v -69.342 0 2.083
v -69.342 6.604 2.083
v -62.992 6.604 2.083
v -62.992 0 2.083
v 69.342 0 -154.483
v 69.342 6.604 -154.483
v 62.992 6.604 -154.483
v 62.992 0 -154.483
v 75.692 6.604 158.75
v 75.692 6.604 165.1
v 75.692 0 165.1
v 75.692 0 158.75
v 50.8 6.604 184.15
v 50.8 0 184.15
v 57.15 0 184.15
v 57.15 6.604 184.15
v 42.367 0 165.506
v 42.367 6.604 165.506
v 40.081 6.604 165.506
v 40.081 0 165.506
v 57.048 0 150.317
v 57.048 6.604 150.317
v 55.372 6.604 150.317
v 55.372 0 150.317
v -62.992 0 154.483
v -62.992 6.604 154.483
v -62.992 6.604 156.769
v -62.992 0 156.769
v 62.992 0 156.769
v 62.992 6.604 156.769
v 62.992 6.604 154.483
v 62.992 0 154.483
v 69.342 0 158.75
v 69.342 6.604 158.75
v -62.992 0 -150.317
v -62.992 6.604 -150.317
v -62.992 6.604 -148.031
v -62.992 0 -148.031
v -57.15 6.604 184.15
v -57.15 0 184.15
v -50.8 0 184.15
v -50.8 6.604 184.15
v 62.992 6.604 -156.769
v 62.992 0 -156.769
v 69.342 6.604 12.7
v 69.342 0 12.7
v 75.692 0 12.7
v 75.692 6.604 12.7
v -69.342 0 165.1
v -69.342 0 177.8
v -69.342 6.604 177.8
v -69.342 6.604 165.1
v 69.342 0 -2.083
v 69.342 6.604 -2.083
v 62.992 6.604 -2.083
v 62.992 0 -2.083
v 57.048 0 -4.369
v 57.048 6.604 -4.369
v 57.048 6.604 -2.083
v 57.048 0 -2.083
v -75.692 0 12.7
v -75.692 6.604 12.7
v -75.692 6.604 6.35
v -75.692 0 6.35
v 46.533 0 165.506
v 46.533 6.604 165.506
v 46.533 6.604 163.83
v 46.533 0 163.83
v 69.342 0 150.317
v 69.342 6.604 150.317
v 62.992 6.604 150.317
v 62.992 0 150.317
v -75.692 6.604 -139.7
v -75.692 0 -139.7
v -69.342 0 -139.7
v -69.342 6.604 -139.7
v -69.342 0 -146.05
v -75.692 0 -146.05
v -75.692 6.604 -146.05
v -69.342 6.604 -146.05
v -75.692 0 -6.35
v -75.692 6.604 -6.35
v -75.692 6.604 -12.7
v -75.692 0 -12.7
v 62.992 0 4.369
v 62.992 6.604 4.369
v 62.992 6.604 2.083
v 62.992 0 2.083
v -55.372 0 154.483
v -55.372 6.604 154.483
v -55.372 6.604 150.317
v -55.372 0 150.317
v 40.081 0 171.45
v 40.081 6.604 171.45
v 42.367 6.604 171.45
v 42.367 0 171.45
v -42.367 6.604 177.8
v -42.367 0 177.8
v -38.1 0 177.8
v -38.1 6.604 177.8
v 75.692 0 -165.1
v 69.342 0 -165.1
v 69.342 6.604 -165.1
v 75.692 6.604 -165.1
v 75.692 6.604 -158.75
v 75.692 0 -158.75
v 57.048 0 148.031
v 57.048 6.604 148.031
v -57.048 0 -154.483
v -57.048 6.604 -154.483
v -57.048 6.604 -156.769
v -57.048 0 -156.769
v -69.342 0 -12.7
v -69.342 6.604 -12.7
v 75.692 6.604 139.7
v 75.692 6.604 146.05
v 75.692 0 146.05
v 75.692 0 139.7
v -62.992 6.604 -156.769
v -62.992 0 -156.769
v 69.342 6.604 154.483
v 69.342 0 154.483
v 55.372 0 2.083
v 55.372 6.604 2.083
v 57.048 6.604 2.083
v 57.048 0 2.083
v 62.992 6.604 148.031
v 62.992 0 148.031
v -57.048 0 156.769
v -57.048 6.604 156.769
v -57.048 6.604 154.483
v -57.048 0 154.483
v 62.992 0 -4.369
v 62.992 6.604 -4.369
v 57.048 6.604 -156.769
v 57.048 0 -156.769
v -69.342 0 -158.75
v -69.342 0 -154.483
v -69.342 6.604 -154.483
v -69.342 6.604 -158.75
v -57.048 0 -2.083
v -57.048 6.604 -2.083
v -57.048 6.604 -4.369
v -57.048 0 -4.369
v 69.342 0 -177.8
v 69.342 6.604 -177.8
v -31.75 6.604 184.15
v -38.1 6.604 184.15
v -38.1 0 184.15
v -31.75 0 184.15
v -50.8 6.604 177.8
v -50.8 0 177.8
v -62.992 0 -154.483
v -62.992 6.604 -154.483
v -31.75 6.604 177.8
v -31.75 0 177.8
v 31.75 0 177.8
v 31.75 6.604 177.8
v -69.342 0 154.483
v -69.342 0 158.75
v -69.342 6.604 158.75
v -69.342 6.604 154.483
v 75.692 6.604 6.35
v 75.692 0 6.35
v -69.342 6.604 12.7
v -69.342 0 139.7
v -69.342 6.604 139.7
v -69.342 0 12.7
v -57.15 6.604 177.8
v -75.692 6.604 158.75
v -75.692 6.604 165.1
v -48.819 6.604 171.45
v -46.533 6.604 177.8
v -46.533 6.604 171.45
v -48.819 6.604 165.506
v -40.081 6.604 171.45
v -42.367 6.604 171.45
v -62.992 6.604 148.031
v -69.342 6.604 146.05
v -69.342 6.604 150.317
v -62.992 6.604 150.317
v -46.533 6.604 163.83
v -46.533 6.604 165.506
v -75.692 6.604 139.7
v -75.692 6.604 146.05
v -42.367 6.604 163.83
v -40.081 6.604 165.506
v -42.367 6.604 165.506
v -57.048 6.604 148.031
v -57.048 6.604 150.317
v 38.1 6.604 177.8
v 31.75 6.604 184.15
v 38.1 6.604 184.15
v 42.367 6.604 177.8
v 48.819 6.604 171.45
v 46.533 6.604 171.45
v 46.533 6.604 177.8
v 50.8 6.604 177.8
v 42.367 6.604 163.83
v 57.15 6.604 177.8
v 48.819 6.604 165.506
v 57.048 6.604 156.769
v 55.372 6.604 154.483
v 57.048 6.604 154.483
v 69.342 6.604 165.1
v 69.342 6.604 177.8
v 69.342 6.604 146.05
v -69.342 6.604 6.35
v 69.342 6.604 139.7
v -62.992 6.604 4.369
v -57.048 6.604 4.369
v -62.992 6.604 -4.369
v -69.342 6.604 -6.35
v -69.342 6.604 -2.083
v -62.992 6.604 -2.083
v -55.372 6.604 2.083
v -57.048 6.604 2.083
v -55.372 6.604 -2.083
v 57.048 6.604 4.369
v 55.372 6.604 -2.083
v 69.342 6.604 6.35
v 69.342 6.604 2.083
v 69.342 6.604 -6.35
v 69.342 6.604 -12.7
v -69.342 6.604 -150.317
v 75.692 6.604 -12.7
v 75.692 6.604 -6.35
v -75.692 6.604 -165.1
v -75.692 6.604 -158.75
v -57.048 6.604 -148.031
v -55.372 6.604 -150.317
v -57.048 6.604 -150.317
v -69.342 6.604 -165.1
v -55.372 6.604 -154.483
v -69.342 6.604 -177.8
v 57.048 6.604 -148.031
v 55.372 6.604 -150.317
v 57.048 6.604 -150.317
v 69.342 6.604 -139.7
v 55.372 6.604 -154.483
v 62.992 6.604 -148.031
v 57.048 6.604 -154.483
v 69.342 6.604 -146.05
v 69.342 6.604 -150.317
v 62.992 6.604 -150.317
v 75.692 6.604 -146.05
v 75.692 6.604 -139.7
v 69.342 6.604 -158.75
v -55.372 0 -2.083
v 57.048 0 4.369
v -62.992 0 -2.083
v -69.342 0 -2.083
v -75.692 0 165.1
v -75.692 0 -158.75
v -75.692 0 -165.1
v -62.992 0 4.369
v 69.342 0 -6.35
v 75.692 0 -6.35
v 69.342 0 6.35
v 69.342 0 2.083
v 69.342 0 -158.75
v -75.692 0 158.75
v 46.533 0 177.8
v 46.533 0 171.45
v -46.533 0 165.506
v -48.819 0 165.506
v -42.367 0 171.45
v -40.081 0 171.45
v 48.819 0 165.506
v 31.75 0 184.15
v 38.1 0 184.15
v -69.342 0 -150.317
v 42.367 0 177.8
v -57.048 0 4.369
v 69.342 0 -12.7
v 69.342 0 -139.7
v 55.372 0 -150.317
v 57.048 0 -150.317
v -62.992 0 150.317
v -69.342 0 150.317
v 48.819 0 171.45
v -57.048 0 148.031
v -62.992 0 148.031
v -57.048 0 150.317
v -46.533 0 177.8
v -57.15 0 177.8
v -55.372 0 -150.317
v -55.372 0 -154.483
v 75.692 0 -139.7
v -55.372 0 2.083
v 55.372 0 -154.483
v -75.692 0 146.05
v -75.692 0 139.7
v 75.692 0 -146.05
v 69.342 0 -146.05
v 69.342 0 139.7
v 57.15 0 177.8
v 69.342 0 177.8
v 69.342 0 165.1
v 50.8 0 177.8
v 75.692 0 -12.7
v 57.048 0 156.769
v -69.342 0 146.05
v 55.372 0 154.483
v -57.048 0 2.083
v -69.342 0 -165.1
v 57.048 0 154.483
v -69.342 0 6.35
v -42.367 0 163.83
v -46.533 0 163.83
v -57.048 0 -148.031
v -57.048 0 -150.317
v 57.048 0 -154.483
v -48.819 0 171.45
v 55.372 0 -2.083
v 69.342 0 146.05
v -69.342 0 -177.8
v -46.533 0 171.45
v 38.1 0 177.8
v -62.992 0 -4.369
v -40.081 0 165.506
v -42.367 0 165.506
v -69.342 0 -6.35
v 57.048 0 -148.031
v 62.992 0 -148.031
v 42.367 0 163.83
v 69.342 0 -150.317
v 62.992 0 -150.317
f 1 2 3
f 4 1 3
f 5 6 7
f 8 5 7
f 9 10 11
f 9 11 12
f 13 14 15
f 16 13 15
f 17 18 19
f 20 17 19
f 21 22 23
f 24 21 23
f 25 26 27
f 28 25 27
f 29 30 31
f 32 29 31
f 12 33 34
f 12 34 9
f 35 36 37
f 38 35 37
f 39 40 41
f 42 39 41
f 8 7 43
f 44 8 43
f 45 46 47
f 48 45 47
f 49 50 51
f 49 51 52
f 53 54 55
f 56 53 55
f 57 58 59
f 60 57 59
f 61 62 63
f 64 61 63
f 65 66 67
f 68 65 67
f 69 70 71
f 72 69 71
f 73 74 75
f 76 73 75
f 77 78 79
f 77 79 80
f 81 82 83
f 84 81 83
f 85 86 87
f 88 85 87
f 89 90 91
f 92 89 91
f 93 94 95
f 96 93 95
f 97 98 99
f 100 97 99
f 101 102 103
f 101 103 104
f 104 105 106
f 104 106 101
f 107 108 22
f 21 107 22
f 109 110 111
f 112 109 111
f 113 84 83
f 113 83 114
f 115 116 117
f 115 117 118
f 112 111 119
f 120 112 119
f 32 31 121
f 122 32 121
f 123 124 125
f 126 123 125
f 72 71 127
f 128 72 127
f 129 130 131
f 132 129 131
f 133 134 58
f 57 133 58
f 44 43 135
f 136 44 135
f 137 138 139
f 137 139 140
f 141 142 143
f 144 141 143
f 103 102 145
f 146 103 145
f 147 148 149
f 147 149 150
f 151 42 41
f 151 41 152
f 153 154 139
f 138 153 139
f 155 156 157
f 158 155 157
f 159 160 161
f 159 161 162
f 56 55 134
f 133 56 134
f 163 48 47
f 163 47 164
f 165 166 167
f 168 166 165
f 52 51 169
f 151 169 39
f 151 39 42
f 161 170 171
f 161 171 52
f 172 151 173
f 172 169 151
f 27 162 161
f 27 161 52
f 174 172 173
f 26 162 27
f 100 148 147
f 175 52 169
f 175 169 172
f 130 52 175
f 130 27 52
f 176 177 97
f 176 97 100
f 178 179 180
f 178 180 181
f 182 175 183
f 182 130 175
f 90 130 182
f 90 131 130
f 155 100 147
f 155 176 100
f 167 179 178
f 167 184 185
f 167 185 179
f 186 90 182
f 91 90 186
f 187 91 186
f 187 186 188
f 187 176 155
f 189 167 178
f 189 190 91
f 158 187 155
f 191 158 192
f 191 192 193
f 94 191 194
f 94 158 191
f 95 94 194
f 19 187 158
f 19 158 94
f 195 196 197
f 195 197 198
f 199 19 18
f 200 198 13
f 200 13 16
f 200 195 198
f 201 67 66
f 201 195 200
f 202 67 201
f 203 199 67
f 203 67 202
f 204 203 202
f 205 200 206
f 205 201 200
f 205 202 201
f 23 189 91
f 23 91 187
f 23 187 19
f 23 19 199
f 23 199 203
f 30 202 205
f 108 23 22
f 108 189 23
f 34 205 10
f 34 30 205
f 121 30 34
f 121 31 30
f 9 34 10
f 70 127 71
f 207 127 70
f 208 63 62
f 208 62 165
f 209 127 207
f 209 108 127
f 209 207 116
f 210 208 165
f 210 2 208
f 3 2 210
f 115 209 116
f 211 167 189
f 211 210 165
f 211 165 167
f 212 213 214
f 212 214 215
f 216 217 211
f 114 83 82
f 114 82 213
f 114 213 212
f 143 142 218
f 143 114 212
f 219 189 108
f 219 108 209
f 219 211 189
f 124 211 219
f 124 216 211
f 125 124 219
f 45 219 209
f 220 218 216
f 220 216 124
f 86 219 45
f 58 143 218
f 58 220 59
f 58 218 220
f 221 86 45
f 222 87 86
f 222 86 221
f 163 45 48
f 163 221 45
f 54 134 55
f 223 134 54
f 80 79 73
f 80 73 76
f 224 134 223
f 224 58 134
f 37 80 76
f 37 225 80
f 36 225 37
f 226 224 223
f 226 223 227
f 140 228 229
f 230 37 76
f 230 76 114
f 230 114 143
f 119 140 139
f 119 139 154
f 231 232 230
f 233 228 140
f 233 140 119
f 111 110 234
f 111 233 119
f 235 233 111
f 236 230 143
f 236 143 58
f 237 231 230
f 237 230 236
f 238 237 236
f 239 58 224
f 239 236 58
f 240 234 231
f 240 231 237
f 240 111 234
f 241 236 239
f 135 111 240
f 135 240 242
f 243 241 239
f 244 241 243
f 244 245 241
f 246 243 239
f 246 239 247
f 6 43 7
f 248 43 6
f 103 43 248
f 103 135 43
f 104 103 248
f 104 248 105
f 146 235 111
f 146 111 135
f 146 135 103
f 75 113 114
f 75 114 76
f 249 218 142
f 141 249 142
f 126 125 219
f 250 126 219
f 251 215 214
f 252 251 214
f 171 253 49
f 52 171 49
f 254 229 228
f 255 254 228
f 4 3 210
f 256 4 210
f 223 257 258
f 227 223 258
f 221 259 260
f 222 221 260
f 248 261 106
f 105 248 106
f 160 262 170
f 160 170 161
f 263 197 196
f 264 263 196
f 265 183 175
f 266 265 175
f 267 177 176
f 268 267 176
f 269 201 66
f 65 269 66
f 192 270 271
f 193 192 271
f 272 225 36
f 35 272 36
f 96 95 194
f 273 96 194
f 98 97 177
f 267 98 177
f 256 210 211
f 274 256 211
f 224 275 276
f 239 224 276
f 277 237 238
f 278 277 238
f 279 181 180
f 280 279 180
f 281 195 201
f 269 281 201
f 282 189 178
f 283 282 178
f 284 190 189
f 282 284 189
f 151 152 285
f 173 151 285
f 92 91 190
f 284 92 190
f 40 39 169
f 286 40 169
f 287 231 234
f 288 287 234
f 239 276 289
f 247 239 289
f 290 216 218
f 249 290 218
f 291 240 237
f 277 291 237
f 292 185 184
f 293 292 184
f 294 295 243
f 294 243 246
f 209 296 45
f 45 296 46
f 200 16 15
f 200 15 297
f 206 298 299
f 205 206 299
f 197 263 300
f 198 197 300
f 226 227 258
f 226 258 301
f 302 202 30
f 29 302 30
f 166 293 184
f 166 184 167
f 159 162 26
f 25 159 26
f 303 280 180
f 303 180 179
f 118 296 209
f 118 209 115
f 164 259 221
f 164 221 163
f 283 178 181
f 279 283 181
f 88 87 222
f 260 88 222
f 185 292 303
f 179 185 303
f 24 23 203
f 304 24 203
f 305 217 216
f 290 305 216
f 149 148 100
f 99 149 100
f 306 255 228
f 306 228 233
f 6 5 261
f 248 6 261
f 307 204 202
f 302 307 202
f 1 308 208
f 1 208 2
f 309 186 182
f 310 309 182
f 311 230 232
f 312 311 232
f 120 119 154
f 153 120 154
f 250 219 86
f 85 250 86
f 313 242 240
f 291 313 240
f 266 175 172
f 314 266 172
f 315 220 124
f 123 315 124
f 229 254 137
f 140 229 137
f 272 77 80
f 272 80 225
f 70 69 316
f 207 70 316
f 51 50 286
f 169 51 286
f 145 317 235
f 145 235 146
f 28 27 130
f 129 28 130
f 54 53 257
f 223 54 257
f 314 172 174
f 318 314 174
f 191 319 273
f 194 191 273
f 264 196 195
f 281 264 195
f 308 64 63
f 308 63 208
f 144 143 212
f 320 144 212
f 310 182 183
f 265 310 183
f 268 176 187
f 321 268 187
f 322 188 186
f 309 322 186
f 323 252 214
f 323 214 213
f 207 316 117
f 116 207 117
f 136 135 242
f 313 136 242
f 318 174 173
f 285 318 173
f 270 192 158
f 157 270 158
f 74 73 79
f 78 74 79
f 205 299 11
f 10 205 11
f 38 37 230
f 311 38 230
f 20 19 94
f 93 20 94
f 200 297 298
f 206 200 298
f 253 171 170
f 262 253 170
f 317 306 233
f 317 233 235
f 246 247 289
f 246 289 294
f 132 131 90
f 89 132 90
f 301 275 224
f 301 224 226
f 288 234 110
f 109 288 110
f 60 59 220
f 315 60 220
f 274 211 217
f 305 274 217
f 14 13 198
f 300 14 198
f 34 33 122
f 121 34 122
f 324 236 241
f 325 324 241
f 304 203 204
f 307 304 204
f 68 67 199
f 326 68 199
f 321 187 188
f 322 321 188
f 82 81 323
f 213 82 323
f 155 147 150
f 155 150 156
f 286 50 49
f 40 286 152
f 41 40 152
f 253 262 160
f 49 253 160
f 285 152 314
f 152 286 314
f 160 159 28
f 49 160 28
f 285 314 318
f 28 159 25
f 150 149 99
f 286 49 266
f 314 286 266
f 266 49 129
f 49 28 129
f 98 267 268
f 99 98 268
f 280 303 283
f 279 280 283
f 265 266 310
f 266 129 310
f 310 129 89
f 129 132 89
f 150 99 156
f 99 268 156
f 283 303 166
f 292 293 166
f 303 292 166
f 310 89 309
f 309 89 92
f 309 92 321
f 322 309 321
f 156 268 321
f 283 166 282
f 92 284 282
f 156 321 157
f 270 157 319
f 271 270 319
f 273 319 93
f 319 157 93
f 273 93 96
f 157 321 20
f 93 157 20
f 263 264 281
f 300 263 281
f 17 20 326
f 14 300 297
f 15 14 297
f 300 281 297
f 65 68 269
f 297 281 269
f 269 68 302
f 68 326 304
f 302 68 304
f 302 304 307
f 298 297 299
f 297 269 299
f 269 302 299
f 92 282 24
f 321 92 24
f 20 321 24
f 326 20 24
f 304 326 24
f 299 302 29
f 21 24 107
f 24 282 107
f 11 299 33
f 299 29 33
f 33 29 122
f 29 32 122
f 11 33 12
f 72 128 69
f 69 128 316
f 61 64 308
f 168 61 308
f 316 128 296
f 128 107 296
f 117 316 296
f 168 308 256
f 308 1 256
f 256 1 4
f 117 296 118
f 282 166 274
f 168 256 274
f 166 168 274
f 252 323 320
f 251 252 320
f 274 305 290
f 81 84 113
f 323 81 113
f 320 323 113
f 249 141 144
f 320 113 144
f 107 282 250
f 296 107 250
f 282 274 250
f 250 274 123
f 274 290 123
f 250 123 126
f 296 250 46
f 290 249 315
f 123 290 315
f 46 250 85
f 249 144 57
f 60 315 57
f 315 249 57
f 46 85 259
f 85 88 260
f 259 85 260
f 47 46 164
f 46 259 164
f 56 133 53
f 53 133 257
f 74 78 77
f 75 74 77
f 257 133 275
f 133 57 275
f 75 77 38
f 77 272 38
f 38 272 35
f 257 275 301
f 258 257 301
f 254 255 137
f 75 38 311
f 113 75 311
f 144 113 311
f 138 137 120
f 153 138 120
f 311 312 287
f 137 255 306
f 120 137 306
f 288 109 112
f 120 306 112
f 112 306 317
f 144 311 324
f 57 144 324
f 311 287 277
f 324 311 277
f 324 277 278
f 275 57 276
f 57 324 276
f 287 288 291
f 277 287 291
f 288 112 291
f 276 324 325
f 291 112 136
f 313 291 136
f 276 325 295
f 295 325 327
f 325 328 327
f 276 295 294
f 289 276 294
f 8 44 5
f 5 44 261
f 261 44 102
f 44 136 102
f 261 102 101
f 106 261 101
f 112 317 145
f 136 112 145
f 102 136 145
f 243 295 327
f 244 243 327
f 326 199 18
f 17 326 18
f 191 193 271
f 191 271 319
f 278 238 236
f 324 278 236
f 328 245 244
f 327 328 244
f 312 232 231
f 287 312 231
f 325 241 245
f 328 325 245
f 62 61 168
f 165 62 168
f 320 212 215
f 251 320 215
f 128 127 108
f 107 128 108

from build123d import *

# Parameters (mm, degrees)
SKETCH1_W           = 138.684
SKETCH1_H           = 355.6
BOSS_EXTRUDE1_DEPTH = 6.604
CUT_EXTRUDE1_DEPTH  = 7.604
SKETCH5_W           = 6.35
SKETCH5_H           = 6.35
BOSS_EXTRUDE2_DEPTH = 6.604


with BuildPart() as part:
    # Sketch1 → Boss-Extrude1 (new body)
    with BuildSketch(Plane(origin=(0, 0, 0), x_dir=(1, 0, 0), z_dir=(0, 1, 0))):
        Rectangle(SKETCH1_W, SKETCH1_H)
    extrude(amount=BOSS_EXTRUDE1_DEPTH)

    # Sketch4 → Cut-Extrude1 (cut, through all)
    with BuildSketch(Plane(origin=(0, 6.604, 0), x_dir=(1, 0, 0), z_dir=(0, 1, 0))):
        Polygon((-62.992, 154.4828), (-69.342, 154.4828), (-69.342, 150.3172), (-62.992, 150.3172), (-62.992, 148.0312), (-57.0484, 148.0312), (-57.0484, 150.3172), (-55.372, 150.3172), (-55.372, 154.4828), (-57.0484, 154.4828), (-57.0484, 156.7688), (-62.992, 156.7688), align=None)
        Polygon((57.0484, 154.4828), (55.372, 154.4828), (55.372, 150.3172), (57.0484, 150.3172), (57.0484, 148.0312), (62.992, 148.0312), (62.992, 150.3172), (69.342, 150.3172), (69.342, 154.4828), (62.992, 154.4828), (62.992, 156.7688), (57.0484, 156.7688), align=None)
        Polygon((-62.992, 2.0828), (-69.342, 2.0828), (-69.342, -2.0828), (-62.992, -2.0828), (-62.992, -4.3688), (-57.0484, -4.3688), (-57.0484, -2.0828), (-55.372, -2.0828), (-55.372, 2.0828), (-57.0484, 2.0828), (-57.0484, 4.3688), (-62.992, 4.3688), align=None)
        Polygon((69.342, 2.0828), (62.992, 2.0828), (62.992, 4.3688), (57.0484, 4.3688), (57.0484, 2.0828), (55.372, 2.0828), (55.372, -2.0828), (57.0484, -2.0828), (57.0484, -4.3688), (62.992, -4.3688), (62.992, -2.0828), (69.342, -2.0828), align=None)
        Polygon((-62.992, -150.3172), (-69.342, -150.3172), (-69.342, -154.4828), (-62.992, -154.4828), (-62.992, -156.7688), (-57.0484, -156.7688), (-57.0484, -154.4828), (-55.372, -154.4828), (-55.372, -150.3172), (-57.0484, -150.3172), (-57.0484, -148.0312), (-62.992, -148.0312), align=None)
        Polygon((69.342, -150.3172), (62.992, -150.3172), (62.992, -148.0312), (57.0484, -148.0312), (57.0484, -150.3172), (55.372, -150.3172), (55.372, -154.4828), (57.0484, -154.4828), (57.0484, -156.7688), (62.992, -156.7688), (62.992, -154.4828), (69.342, -154.4828), align=None)
        Polygon((-46.5328, -165.5064), (-48.8188, -165.5064), (-48.8188, -171.45), (-46.5328, -171.45), (-46.5328, -177.8), (-42.3672, -177.8), (-42.3672, -171.45), (-40.0812, -171.45), (-40.0812, -165.5064), (-42.3672, -165.5064), (-42.3672, -163.83), (-46.5328, -163.83), align=None)
        Polygon((48.8188, -165.5064), (46.5328, -165.5064), (46.5328, -163.83), (42.3672, -163.83), (42.3672, -165.5064), (40.0812, -165.5064), (40.0812, -171.45), (42.3672, -171.45), (42.3672, -177.8), (46.5328, -177.8), (46.5328, -171.45), (48.8188, -171.45), align=None)
    extrude(amount=-CUT_EXTRUDE1_DEPTH, mode=Mode.SUBTRACT)

    # Sketch5 → Boss-Extrude2 (add)
    with BuildSketch(Plane(origin=(0, 6.604, 0), x_dir=(1, 0, 0), z_dir=(0, 1, 0))):
        with Locations((-72.517, 161.925)):
            Rectangle(SKETCH5_W, SKETCH5_H)
        with Locations((-72.517, 142.875)):
            Rectangle(SKETCH5_W, SKETCH5_H)
        with Locations((72.517, 161.925)):
            Rectangle(SKETCH5_W, SKETCH5_H)
        with Locations((72.517, 142.875)):
            Rectangle(SKETCH5_W, SKETCH5_H)
        with Locations((-72.517, 9.525)):
            Rectangle(SKETCH5_W, SKETCH5_H)
        with Locations((-72.517, -9.525)):
            Rectangle(SKETCH5_W, SKETCH5_H)
        with Locations((-72.517, -142.875)):
            Rectangle(SKETCH5_W, SKETCH5_H)
        with Locations((-72.517, -161.925)):
            Rectangle(SKETCH5_W, SKETCH5_H)
        with Locations((72.517, -161.925)):
            Rectangle(SKETCH5_W, SKETCH5_H)
        with Locations((72.517, -142.875)):
            Rectangle(SKETCH5_W, SKETCH5_H)
        with Locations((72.517, -9.525)):
            Rectangle(SKETCH5_W, SKETCH5_H)
        with Locations((72.517, 9.525)):
            Rectangle(SKETCH5_W, SKETCH5_H)
        with Locations((-53.975, -180.975)):
            Rectangle(SKETCH5_W, SKETCH5_H)
        with Locations((-34.925, -180.975)):
            Rectangle(SKETCH5_W, SKETCH5_H)
        with Locations((34.925, -180.975)):
            Rectangle(SKETCH5_W, SKETCH5_H)
        with Locations((53.975, -180.975)):
            Rectangle(SKETCH5_W, SKETCH5_H)
    extrude(amount=-BOSS_EXTRUDE2_DEPTH)


solid = part.part
